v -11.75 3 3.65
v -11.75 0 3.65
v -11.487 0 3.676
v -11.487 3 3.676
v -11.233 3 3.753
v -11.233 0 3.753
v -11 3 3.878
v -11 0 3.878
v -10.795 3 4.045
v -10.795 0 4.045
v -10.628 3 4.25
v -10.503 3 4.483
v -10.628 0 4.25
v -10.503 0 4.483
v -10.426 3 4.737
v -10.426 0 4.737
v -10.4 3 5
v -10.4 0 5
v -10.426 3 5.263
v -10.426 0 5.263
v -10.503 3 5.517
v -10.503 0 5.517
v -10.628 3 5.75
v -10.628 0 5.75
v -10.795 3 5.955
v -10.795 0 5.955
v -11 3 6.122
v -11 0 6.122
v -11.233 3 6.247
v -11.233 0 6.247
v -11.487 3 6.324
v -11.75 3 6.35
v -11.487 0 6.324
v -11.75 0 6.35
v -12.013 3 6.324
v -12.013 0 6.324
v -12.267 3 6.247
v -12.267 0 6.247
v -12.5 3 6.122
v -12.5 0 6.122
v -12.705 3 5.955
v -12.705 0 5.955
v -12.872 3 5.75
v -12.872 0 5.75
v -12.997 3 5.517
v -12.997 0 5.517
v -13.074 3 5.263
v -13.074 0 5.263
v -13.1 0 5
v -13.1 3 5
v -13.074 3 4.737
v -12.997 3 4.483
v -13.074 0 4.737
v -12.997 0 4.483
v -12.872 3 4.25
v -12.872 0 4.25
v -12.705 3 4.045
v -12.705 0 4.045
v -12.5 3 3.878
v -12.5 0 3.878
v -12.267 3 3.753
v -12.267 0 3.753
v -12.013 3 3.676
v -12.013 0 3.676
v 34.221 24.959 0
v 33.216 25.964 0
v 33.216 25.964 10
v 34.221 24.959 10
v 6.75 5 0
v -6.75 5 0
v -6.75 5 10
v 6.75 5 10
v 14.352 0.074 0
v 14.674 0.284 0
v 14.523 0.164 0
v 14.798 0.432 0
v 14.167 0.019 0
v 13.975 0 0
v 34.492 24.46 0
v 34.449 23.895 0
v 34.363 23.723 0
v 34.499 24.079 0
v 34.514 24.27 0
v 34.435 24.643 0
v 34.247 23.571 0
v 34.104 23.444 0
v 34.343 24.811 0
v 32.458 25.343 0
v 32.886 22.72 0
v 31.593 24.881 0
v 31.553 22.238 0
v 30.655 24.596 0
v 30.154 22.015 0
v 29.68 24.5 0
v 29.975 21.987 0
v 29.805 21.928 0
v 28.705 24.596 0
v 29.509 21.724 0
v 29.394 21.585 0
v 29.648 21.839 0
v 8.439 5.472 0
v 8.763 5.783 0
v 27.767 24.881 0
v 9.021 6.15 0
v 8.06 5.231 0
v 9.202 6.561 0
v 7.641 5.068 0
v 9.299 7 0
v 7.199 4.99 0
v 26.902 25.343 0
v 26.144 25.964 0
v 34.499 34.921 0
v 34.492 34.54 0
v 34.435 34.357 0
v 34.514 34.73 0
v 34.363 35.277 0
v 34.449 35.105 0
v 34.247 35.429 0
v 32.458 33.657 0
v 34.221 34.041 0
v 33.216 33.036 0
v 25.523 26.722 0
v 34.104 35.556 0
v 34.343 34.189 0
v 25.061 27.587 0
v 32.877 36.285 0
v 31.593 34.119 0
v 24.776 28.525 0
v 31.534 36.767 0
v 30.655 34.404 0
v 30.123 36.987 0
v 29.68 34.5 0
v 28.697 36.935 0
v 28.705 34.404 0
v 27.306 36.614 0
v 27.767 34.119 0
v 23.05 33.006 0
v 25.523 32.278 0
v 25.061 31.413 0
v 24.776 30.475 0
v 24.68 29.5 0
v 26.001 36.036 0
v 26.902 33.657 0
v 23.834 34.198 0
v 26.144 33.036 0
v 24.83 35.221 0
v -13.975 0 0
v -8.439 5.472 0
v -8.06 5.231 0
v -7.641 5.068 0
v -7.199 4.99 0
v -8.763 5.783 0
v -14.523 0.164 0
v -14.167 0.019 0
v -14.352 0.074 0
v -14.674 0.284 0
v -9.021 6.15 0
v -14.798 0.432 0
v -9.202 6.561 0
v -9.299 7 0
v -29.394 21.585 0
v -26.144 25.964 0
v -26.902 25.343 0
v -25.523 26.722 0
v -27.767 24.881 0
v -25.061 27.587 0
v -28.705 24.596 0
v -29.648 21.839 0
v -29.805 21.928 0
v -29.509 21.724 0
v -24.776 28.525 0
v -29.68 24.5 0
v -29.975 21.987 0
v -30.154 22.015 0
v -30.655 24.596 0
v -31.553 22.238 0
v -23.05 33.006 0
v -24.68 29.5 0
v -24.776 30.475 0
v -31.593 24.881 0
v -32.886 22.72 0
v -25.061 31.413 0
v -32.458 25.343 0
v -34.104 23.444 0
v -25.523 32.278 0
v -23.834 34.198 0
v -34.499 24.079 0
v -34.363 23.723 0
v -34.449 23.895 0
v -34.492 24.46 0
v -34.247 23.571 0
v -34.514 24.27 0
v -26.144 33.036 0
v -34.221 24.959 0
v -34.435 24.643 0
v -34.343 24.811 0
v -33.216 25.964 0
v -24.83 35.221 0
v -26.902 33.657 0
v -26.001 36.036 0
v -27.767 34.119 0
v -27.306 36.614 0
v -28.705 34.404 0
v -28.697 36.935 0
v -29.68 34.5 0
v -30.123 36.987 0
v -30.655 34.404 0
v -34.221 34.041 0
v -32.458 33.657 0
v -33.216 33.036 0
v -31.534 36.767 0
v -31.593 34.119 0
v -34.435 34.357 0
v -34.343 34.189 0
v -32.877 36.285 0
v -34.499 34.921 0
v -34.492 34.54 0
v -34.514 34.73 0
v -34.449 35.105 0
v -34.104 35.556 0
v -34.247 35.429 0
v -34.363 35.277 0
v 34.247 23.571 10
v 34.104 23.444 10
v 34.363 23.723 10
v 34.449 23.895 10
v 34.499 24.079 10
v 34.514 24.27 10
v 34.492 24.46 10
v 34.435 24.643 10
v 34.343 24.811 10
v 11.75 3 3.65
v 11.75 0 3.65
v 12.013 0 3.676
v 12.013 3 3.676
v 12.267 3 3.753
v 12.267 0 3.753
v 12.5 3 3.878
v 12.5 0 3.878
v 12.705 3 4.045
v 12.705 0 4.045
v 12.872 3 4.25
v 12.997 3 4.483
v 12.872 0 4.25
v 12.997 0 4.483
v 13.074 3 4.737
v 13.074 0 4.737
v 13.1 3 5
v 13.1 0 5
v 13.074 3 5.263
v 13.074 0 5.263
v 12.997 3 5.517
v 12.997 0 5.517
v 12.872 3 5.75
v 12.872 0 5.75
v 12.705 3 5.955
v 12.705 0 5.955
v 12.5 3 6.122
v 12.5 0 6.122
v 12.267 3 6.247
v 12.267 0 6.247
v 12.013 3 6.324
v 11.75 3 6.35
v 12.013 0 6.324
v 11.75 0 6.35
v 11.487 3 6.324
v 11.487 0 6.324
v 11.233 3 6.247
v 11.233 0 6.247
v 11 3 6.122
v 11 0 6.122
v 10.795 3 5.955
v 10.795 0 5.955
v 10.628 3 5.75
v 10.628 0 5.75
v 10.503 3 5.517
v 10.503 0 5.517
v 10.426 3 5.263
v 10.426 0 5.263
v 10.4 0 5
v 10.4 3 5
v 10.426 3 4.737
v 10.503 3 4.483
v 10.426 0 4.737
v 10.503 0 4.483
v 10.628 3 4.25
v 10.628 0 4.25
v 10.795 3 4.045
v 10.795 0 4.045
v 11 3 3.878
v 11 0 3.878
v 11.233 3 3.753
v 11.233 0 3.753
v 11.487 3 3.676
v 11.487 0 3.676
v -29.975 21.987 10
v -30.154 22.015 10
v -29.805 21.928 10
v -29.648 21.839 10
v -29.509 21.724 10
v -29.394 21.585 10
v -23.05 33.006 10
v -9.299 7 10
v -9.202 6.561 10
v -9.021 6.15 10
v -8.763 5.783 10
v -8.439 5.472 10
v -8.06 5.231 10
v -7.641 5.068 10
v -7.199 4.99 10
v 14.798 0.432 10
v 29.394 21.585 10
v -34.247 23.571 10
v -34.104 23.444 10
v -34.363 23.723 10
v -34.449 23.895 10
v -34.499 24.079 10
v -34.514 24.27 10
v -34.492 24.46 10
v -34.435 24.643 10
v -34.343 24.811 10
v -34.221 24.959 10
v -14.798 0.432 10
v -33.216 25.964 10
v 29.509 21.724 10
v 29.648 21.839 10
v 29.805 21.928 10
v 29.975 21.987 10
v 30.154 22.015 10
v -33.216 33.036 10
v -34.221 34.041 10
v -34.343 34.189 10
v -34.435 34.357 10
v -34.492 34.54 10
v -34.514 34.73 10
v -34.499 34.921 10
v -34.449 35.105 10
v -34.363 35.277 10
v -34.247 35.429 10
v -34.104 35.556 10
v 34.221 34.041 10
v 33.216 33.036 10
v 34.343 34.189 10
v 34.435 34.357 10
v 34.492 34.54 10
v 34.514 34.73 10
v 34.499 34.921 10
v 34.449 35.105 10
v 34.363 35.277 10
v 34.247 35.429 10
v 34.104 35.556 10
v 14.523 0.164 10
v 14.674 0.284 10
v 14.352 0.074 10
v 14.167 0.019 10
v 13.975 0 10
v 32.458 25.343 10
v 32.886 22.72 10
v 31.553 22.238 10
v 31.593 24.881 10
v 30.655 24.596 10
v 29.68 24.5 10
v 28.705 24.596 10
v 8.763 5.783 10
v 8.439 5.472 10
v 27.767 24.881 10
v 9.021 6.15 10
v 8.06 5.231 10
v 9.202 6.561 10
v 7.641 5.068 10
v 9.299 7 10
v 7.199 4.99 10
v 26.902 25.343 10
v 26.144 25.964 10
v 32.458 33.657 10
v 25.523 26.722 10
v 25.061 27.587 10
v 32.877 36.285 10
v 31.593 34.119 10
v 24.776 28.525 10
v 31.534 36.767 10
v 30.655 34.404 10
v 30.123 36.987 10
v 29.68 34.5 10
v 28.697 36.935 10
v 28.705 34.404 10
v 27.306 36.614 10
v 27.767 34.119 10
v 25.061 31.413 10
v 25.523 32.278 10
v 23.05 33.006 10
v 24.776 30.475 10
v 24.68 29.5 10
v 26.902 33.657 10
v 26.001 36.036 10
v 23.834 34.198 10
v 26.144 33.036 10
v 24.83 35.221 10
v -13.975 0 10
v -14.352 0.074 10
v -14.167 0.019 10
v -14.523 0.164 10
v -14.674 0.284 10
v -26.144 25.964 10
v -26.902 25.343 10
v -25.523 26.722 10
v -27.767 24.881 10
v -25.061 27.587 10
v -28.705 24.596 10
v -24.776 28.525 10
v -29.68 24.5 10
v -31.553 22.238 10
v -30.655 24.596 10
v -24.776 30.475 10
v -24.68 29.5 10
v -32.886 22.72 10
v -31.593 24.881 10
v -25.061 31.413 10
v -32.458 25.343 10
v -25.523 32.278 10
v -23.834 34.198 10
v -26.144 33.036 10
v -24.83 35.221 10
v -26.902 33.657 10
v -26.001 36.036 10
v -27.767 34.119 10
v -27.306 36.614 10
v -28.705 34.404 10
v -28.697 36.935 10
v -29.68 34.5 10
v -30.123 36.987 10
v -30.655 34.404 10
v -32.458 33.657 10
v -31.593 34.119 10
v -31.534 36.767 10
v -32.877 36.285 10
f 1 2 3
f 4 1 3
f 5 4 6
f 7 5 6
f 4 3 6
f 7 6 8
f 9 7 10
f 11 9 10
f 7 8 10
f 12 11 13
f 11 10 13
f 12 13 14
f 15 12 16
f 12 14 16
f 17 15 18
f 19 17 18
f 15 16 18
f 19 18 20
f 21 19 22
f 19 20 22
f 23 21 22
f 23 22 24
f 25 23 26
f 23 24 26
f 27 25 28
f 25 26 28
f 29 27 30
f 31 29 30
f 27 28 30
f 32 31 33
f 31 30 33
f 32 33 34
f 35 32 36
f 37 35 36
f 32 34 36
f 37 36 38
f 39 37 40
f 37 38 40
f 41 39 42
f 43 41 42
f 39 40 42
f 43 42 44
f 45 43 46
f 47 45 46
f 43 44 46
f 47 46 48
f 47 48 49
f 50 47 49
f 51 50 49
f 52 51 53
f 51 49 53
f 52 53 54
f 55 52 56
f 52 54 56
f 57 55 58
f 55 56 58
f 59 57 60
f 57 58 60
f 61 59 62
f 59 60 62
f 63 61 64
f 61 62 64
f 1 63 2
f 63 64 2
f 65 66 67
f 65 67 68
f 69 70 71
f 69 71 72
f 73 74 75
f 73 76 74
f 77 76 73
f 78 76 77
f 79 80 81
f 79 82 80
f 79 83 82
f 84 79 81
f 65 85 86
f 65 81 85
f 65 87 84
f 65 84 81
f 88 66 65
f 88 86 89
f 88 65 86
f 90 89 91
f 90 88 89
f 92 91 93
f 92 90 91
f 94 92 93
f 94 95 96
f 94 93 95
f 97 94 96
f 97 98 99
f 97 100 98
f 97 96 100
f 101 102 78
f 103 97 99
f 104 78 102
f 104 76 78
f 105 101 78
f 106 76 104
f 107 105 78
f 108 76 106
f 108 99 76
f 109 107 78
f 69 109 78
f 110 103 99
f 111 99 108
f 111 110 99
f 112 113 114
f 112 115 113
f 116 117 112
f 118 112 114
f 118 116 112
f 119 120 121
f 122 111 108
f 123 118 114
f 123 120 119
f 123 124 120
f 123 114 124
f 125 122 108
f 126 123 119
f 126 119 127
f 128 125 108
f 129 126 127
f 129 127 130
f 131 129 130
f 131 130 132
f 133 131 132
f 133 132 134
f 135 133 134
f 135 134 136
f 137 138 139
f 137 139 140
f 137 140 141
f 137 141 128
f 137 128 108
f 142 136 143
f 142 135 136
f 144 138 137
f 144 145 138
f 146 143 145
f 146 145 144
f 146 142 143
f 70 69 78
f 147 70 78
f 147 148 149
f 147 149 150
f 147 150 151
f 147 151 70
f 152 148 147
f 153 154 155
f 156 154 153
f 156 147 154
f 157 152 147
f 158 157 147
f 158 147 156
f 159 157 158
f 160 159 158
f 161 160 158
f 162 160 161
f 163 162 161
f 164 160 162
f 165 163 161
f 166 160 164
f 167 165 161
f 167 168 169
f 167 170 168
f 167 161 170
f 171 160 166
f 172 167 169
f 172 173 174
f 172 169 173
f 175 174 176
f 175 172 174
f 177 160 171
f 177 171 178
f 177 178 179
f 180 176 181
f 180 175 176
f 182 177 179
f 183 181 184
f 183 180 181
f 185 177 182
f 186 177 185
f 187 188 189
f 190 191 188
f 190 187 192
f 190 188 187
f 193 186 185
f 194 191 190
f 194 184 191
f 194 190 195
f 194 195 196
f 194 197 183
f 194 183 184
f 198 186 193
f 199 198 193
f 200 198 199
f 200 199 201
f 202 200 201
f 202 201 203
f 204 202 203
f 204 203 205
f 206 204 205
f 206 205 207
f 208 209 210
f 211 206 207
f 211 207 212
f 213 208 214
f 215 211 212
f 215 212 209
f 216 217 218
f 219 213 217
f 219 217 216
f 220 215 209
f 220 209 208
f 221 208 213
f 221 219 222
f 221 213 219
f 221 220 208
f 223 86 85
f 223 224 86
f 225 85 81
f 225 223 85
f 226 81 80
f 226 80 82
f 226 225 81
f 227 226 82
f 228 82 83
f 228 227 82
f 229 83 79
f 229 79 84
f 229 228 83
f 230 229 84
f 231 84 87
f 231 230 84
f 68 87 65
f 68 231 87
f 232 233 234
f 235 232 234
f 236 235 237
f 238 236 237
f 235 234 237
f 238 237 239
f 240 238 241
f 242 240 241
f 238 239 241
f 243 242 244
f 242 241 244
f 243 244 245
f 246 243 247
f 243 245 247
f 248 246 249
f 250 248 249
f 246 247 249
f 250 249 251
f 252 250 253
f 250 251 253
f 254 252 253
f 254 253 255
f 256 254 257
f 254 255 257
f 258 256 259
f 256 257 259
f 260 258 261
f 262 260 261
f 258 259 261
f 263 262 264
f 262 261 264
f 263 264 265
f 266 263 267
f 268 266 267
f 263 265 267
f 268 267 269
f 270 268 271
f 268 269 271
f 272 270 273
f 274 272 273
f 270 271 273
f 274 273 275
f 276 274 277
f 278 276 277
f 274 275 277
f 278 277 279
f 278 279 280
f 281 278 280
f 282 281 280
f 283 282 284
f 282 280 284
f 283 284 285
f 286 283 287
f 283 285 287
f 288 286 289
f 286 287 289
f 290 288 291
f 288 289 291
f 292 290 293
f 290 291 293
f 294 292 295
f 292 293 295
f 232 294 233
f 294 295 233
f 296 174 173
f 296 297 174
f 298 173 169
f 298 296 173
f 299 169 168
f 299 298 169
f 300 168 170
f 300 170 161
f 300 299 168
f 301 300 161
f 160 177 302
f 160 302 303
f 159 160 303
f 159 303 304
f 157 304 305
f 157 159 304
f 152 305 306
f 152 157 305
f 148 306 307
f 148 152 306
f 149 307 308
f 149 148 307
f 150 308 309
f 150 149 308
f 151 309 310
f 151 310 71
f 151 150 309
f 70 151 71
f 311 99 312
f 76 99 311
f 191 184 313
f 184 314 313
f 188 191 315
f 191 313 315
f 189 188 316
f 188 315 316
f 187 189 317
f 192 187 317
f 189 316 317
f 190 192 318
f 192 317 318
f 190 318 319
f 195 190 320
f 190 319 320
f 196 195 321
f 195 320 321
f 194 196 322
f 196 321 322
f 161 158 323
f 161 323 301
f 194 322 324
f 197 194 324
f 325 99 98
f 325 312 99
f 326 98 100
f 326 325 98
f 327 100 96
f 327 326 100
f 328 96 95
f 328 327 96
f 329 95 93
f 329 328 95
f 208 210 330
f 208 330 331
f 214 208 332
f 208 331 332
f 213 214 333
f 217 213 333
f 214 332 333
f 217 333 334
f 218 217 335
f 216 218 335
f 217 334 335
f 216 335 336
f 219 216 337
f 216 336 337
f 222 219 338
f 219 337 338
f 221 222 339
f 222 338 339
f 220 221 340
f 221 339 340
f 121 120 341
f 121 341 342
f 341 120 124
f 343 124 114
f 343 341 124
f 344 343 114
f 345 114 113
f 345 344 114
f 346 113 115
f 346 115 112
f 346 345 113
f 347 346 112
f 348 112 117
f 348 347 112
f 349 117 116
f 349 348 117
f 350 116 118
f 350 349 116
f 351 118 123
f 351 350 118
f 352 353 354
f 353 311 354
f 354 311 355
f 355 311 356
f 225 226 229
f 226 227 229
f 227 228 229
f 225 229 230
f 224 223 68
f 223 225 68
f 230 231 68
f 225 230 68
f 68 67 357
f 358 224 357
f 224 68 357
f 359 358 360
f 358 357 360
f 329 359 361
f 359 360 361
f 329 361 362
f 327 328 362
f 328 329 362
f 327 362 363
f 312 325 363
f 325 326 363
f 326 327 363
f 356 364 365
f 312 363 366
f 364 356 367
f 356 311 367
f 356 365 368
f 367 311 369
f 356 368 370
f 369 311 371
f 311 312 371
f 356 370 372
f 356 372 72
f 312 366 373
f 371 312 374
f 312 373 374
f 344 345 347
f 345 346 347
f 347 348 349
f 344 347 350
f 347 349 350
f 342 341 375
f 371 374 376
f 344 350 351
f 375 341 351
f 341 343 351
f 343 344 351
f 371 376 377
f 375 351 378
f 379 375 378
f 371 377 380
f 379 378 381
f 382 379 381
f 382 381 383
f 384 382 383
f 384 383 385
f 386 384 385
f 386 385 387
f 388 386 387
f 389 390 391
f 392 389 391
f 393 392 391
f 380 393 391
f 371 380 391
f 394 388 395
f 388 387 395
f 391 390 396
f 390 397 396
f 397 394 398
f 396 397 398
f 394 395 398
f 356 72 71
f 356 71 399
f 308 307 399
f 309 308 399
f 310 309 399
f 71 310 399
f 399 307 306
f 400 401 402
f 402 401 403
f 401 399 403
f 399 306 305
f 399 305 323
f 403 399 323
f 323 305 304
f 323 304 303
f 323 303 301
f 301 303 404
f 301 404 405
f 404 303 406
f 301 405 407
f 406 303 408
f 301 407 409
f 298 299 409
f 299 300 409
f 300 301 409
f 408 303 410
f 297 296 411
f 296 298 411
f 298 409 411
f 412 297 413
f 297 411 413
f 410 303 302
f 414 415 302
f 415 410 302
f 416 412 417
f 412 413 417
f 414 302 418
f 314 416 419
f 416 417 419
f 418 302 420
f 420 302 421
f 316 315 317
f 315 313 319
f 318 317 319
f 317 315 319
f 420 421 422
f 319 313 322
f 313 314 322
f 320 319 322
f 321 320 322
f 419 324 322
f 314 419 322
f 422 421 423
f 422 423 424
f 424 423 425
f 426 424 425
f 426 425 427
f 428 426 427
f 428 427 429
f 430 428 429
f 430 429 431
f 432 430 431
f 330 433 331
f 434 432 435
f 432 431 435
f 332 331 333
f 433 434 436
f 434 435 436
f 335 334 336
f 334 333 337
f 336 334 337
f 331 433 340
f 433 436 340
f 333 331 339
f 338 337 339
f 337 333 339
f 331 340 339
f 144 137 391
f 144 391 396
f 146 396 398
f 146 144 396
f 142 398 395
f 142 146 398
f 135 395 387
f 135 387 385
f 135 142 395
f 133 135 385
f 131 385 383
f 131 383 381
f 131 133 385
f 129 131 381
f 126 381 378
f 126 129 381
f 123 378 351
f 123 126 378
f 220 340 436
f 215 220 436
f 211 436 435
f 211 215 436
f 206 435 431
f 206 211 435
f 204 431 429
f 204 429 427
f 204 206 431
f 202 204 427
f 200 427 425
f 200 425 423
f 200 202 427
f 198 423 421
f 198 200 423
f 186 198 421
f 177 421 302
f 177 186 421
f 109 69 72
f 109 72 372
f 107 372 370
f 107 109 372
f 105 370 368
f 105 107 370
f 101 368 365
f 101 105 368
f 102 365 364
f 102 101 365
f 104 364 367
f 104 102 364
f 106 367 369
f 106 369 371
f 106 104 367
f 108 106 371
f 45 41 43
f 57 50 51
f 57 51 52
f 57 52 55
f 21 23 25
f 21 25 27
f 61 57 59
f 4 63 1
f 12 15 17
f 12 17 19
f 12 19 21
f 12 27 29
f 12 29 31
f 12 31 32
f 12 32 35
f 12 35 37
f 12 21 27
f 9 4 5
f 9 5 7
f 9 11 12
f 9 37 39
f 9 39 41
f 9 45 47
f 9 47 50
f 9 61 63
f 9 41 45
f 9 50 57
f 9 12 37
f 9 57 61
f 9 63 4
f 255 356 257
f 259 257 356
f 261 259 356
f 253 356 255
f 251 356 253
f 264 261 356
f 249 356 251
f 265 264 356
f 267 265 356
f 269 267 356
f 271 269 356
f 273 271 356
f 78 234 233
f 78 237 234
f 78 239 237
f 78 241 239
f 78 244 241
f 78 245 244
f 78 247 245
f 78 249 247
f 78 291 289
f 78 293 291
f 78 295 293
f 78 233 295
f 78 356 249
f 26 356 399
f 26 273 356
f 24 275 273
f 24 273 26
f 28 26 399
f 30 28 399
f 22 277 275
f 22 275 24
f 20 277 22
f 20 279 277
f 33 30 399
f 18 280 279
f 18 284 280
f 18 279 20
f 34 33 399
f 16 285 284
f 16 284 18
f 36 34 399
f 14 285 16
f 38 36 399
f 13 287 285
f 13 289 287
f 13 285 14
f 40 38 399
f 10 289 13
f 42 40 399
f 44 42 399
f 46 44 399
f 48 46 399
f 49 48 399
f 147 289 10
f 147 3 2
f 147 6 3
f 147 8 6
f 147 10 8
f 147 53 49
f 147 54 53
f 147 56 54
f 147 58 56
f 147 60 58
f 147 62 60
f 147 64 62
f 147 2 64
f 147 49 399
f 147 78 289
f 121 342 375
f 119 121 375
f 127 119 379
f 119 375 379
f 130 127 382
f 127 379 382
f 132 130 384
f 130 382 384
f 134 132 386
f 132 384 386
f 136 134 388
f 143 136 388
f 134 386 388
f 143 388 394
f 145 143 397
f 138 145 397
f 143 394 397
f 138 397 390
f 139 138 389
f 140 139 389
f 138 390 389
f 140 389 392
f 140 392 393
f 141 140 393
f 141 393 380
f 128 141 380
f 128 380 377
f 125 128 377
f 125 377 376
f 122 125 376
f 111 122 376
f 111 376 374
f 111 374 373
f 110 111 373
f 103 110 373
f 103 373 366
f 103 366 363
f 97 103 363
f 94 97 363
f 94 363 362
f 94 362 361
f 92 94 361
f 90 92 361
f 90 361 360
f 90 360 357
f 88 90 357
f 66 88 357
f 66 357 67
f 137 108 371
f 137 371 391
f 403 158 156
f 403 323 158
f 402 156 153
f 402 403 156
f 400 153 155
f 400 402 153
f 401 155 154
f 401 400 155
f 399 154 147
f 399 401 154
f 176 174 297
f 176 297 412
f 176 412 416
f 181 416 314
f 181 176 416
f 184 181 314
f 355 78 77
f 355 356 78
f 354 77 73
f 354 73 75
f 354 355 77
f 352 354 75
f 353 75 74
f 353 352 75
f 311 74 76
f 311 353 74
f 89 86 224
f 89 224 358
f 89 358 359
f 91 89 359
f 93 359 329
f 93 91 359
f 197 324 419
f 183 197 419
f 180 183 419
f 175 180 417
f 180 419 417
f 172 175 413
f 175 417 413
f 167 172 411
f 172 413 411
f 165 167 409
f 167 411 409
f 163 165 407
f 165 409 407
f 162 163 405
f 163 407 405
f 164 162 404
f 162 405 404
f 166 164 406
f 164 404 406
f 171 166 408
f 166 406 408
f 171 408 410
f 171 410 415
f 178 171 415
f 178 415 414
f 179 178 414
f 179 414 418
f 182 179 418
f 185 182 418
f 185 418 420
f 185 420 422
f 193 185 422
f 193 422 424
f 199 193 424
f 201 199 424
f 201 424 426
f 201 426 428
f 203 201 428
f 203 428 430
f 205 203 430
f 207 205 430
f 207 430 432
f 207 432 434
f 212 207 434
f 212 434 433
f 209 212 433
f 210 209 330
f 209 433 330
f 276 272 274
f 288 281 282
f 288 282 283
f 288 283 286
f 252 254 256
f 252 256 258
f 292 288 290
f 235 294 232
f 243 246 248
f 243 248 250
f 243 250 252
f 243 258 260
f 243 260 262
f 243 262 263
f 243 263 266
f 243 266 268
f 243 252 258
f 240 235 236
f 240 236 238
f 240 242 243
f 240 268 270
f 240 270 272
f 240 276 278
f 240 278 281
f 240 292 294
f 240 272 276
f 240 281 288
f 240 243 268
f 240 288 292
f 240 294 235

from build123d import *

# Parameters (mm, degrees)
BOSS_EXTRUDE2_DEPTH = 10
SKETCH2_R           = 5
CUT_EXTRUDE1_DEPTH  = 10
SKETCH3_R           = 1.35
CUT_EXTRUDE2_DEPTH  = 3
FILLET1_R           = 1
FILLET2_R           = 1


with BuildPart() as part:
    # Sketch1 → Boss-Extrude2 (new body)
    with BuildSketch(Plane.XY):
        with BuildLine():
            Line((14.5, 0), (-14.5, 0))
            Line((-14.5, 0), (-29.68, 22))
            ThreePointArc((-29.68, 22), (-32.550125743, 22.570903506), (-34.983300859, 24.196699141))
            Line((-34.983300859, 24.196699141), (-29.68, 29.5))
            Line((-29.68, 29.5), (-34.983300859, 34.803300859))
            ThreePointArc((-34.983300859, 34.803300859), (-28.562836183, 36.916329618), (-23.049751963, 33.005682668))
            Line((-23.049751963, 33.005682668), (-9.299486441, 7))
            ThreePointArc((-9.299486441, 7), (-8.438956783, 5.47198407), (-6.75, 5))
            Line((-6.75, 5), (6.75, 5))
            ThreePointArc((6.75, 5), (8.438956783, 5.47198407), (9.299486441, 7))
            Line((9.299486441, 7), (23.049751963, 33.005682668))
            ThreePointArc((23.049751963, 33.005682668), (28.562836183, 36.916329618), (34.983300859, 34.803300859))
            Line((34.983300859, 34.803300859), (29.68, 29.5))
            Line((29.68, 29.5), (34.983300859, 24.196699141))
            ThreePointArc((34.983300859, 24.196699141), (32.550125743, 22.570903506), (29.68, 22))
            Line((29.68, 22), (14.5, 0))
        make_face()
    extrude(amount=BOSS_EXTRUDE2_DEPTH)

    # Sketch2 → Cut-Extrude1 (cut)
    with BuildSketch(Plane.XY.offset(10)):
        with Locations((-29.68, 29.5)):
            Circle(SKETCH2_R)
        with Locations((29.68, 29.5)):
            Circle(SKETCH2_R)
    extrude(amount=-CUT_EXTRUDE1_DEPTH, mode=Mode.SUBTRACT)

    # Sketch3 → Cut-Extrude2 (cut)
    with BuildSketch(Plane.XZ):
        with Locations(Location((-11.75, 5, 0), (0, 0, 270))):
            Circle(SKETCH3_R)
        with Locations(Location((11.75, 5, 0), (0, 0, 270))):
            Circle(SKETCH3_R)
    extrude(amount=-CUT_EXTRUDE2_DEPTH, mode=Mode.SUBTRACT)

    # Fillet1
    fillet1_edges = [part.edges().sort_by_distance(p)[0] for p in [
        (-34.983300859, 24.196699141, 5),
        (-34.983300859, 34.803300859, 5),
    ]]
    fillet(fillet1_edges, radius=FILLET1_R)

    # Fillet2
    fillet2_edges = [part.edges().sort_by_distance(p)[0] for p in [
        (-29.68, 22, 5),
        (34.983300859, 34.803300859, 5),
        (34.983300859, 24.196699141, 5),
        (29.68, 22, 5),
        (14.5, 0, 5),
        (-14.5, 0, 5),
    ]]
    fillet(fillet2_edges, radius=FILLET2_R)


solid = part.part
